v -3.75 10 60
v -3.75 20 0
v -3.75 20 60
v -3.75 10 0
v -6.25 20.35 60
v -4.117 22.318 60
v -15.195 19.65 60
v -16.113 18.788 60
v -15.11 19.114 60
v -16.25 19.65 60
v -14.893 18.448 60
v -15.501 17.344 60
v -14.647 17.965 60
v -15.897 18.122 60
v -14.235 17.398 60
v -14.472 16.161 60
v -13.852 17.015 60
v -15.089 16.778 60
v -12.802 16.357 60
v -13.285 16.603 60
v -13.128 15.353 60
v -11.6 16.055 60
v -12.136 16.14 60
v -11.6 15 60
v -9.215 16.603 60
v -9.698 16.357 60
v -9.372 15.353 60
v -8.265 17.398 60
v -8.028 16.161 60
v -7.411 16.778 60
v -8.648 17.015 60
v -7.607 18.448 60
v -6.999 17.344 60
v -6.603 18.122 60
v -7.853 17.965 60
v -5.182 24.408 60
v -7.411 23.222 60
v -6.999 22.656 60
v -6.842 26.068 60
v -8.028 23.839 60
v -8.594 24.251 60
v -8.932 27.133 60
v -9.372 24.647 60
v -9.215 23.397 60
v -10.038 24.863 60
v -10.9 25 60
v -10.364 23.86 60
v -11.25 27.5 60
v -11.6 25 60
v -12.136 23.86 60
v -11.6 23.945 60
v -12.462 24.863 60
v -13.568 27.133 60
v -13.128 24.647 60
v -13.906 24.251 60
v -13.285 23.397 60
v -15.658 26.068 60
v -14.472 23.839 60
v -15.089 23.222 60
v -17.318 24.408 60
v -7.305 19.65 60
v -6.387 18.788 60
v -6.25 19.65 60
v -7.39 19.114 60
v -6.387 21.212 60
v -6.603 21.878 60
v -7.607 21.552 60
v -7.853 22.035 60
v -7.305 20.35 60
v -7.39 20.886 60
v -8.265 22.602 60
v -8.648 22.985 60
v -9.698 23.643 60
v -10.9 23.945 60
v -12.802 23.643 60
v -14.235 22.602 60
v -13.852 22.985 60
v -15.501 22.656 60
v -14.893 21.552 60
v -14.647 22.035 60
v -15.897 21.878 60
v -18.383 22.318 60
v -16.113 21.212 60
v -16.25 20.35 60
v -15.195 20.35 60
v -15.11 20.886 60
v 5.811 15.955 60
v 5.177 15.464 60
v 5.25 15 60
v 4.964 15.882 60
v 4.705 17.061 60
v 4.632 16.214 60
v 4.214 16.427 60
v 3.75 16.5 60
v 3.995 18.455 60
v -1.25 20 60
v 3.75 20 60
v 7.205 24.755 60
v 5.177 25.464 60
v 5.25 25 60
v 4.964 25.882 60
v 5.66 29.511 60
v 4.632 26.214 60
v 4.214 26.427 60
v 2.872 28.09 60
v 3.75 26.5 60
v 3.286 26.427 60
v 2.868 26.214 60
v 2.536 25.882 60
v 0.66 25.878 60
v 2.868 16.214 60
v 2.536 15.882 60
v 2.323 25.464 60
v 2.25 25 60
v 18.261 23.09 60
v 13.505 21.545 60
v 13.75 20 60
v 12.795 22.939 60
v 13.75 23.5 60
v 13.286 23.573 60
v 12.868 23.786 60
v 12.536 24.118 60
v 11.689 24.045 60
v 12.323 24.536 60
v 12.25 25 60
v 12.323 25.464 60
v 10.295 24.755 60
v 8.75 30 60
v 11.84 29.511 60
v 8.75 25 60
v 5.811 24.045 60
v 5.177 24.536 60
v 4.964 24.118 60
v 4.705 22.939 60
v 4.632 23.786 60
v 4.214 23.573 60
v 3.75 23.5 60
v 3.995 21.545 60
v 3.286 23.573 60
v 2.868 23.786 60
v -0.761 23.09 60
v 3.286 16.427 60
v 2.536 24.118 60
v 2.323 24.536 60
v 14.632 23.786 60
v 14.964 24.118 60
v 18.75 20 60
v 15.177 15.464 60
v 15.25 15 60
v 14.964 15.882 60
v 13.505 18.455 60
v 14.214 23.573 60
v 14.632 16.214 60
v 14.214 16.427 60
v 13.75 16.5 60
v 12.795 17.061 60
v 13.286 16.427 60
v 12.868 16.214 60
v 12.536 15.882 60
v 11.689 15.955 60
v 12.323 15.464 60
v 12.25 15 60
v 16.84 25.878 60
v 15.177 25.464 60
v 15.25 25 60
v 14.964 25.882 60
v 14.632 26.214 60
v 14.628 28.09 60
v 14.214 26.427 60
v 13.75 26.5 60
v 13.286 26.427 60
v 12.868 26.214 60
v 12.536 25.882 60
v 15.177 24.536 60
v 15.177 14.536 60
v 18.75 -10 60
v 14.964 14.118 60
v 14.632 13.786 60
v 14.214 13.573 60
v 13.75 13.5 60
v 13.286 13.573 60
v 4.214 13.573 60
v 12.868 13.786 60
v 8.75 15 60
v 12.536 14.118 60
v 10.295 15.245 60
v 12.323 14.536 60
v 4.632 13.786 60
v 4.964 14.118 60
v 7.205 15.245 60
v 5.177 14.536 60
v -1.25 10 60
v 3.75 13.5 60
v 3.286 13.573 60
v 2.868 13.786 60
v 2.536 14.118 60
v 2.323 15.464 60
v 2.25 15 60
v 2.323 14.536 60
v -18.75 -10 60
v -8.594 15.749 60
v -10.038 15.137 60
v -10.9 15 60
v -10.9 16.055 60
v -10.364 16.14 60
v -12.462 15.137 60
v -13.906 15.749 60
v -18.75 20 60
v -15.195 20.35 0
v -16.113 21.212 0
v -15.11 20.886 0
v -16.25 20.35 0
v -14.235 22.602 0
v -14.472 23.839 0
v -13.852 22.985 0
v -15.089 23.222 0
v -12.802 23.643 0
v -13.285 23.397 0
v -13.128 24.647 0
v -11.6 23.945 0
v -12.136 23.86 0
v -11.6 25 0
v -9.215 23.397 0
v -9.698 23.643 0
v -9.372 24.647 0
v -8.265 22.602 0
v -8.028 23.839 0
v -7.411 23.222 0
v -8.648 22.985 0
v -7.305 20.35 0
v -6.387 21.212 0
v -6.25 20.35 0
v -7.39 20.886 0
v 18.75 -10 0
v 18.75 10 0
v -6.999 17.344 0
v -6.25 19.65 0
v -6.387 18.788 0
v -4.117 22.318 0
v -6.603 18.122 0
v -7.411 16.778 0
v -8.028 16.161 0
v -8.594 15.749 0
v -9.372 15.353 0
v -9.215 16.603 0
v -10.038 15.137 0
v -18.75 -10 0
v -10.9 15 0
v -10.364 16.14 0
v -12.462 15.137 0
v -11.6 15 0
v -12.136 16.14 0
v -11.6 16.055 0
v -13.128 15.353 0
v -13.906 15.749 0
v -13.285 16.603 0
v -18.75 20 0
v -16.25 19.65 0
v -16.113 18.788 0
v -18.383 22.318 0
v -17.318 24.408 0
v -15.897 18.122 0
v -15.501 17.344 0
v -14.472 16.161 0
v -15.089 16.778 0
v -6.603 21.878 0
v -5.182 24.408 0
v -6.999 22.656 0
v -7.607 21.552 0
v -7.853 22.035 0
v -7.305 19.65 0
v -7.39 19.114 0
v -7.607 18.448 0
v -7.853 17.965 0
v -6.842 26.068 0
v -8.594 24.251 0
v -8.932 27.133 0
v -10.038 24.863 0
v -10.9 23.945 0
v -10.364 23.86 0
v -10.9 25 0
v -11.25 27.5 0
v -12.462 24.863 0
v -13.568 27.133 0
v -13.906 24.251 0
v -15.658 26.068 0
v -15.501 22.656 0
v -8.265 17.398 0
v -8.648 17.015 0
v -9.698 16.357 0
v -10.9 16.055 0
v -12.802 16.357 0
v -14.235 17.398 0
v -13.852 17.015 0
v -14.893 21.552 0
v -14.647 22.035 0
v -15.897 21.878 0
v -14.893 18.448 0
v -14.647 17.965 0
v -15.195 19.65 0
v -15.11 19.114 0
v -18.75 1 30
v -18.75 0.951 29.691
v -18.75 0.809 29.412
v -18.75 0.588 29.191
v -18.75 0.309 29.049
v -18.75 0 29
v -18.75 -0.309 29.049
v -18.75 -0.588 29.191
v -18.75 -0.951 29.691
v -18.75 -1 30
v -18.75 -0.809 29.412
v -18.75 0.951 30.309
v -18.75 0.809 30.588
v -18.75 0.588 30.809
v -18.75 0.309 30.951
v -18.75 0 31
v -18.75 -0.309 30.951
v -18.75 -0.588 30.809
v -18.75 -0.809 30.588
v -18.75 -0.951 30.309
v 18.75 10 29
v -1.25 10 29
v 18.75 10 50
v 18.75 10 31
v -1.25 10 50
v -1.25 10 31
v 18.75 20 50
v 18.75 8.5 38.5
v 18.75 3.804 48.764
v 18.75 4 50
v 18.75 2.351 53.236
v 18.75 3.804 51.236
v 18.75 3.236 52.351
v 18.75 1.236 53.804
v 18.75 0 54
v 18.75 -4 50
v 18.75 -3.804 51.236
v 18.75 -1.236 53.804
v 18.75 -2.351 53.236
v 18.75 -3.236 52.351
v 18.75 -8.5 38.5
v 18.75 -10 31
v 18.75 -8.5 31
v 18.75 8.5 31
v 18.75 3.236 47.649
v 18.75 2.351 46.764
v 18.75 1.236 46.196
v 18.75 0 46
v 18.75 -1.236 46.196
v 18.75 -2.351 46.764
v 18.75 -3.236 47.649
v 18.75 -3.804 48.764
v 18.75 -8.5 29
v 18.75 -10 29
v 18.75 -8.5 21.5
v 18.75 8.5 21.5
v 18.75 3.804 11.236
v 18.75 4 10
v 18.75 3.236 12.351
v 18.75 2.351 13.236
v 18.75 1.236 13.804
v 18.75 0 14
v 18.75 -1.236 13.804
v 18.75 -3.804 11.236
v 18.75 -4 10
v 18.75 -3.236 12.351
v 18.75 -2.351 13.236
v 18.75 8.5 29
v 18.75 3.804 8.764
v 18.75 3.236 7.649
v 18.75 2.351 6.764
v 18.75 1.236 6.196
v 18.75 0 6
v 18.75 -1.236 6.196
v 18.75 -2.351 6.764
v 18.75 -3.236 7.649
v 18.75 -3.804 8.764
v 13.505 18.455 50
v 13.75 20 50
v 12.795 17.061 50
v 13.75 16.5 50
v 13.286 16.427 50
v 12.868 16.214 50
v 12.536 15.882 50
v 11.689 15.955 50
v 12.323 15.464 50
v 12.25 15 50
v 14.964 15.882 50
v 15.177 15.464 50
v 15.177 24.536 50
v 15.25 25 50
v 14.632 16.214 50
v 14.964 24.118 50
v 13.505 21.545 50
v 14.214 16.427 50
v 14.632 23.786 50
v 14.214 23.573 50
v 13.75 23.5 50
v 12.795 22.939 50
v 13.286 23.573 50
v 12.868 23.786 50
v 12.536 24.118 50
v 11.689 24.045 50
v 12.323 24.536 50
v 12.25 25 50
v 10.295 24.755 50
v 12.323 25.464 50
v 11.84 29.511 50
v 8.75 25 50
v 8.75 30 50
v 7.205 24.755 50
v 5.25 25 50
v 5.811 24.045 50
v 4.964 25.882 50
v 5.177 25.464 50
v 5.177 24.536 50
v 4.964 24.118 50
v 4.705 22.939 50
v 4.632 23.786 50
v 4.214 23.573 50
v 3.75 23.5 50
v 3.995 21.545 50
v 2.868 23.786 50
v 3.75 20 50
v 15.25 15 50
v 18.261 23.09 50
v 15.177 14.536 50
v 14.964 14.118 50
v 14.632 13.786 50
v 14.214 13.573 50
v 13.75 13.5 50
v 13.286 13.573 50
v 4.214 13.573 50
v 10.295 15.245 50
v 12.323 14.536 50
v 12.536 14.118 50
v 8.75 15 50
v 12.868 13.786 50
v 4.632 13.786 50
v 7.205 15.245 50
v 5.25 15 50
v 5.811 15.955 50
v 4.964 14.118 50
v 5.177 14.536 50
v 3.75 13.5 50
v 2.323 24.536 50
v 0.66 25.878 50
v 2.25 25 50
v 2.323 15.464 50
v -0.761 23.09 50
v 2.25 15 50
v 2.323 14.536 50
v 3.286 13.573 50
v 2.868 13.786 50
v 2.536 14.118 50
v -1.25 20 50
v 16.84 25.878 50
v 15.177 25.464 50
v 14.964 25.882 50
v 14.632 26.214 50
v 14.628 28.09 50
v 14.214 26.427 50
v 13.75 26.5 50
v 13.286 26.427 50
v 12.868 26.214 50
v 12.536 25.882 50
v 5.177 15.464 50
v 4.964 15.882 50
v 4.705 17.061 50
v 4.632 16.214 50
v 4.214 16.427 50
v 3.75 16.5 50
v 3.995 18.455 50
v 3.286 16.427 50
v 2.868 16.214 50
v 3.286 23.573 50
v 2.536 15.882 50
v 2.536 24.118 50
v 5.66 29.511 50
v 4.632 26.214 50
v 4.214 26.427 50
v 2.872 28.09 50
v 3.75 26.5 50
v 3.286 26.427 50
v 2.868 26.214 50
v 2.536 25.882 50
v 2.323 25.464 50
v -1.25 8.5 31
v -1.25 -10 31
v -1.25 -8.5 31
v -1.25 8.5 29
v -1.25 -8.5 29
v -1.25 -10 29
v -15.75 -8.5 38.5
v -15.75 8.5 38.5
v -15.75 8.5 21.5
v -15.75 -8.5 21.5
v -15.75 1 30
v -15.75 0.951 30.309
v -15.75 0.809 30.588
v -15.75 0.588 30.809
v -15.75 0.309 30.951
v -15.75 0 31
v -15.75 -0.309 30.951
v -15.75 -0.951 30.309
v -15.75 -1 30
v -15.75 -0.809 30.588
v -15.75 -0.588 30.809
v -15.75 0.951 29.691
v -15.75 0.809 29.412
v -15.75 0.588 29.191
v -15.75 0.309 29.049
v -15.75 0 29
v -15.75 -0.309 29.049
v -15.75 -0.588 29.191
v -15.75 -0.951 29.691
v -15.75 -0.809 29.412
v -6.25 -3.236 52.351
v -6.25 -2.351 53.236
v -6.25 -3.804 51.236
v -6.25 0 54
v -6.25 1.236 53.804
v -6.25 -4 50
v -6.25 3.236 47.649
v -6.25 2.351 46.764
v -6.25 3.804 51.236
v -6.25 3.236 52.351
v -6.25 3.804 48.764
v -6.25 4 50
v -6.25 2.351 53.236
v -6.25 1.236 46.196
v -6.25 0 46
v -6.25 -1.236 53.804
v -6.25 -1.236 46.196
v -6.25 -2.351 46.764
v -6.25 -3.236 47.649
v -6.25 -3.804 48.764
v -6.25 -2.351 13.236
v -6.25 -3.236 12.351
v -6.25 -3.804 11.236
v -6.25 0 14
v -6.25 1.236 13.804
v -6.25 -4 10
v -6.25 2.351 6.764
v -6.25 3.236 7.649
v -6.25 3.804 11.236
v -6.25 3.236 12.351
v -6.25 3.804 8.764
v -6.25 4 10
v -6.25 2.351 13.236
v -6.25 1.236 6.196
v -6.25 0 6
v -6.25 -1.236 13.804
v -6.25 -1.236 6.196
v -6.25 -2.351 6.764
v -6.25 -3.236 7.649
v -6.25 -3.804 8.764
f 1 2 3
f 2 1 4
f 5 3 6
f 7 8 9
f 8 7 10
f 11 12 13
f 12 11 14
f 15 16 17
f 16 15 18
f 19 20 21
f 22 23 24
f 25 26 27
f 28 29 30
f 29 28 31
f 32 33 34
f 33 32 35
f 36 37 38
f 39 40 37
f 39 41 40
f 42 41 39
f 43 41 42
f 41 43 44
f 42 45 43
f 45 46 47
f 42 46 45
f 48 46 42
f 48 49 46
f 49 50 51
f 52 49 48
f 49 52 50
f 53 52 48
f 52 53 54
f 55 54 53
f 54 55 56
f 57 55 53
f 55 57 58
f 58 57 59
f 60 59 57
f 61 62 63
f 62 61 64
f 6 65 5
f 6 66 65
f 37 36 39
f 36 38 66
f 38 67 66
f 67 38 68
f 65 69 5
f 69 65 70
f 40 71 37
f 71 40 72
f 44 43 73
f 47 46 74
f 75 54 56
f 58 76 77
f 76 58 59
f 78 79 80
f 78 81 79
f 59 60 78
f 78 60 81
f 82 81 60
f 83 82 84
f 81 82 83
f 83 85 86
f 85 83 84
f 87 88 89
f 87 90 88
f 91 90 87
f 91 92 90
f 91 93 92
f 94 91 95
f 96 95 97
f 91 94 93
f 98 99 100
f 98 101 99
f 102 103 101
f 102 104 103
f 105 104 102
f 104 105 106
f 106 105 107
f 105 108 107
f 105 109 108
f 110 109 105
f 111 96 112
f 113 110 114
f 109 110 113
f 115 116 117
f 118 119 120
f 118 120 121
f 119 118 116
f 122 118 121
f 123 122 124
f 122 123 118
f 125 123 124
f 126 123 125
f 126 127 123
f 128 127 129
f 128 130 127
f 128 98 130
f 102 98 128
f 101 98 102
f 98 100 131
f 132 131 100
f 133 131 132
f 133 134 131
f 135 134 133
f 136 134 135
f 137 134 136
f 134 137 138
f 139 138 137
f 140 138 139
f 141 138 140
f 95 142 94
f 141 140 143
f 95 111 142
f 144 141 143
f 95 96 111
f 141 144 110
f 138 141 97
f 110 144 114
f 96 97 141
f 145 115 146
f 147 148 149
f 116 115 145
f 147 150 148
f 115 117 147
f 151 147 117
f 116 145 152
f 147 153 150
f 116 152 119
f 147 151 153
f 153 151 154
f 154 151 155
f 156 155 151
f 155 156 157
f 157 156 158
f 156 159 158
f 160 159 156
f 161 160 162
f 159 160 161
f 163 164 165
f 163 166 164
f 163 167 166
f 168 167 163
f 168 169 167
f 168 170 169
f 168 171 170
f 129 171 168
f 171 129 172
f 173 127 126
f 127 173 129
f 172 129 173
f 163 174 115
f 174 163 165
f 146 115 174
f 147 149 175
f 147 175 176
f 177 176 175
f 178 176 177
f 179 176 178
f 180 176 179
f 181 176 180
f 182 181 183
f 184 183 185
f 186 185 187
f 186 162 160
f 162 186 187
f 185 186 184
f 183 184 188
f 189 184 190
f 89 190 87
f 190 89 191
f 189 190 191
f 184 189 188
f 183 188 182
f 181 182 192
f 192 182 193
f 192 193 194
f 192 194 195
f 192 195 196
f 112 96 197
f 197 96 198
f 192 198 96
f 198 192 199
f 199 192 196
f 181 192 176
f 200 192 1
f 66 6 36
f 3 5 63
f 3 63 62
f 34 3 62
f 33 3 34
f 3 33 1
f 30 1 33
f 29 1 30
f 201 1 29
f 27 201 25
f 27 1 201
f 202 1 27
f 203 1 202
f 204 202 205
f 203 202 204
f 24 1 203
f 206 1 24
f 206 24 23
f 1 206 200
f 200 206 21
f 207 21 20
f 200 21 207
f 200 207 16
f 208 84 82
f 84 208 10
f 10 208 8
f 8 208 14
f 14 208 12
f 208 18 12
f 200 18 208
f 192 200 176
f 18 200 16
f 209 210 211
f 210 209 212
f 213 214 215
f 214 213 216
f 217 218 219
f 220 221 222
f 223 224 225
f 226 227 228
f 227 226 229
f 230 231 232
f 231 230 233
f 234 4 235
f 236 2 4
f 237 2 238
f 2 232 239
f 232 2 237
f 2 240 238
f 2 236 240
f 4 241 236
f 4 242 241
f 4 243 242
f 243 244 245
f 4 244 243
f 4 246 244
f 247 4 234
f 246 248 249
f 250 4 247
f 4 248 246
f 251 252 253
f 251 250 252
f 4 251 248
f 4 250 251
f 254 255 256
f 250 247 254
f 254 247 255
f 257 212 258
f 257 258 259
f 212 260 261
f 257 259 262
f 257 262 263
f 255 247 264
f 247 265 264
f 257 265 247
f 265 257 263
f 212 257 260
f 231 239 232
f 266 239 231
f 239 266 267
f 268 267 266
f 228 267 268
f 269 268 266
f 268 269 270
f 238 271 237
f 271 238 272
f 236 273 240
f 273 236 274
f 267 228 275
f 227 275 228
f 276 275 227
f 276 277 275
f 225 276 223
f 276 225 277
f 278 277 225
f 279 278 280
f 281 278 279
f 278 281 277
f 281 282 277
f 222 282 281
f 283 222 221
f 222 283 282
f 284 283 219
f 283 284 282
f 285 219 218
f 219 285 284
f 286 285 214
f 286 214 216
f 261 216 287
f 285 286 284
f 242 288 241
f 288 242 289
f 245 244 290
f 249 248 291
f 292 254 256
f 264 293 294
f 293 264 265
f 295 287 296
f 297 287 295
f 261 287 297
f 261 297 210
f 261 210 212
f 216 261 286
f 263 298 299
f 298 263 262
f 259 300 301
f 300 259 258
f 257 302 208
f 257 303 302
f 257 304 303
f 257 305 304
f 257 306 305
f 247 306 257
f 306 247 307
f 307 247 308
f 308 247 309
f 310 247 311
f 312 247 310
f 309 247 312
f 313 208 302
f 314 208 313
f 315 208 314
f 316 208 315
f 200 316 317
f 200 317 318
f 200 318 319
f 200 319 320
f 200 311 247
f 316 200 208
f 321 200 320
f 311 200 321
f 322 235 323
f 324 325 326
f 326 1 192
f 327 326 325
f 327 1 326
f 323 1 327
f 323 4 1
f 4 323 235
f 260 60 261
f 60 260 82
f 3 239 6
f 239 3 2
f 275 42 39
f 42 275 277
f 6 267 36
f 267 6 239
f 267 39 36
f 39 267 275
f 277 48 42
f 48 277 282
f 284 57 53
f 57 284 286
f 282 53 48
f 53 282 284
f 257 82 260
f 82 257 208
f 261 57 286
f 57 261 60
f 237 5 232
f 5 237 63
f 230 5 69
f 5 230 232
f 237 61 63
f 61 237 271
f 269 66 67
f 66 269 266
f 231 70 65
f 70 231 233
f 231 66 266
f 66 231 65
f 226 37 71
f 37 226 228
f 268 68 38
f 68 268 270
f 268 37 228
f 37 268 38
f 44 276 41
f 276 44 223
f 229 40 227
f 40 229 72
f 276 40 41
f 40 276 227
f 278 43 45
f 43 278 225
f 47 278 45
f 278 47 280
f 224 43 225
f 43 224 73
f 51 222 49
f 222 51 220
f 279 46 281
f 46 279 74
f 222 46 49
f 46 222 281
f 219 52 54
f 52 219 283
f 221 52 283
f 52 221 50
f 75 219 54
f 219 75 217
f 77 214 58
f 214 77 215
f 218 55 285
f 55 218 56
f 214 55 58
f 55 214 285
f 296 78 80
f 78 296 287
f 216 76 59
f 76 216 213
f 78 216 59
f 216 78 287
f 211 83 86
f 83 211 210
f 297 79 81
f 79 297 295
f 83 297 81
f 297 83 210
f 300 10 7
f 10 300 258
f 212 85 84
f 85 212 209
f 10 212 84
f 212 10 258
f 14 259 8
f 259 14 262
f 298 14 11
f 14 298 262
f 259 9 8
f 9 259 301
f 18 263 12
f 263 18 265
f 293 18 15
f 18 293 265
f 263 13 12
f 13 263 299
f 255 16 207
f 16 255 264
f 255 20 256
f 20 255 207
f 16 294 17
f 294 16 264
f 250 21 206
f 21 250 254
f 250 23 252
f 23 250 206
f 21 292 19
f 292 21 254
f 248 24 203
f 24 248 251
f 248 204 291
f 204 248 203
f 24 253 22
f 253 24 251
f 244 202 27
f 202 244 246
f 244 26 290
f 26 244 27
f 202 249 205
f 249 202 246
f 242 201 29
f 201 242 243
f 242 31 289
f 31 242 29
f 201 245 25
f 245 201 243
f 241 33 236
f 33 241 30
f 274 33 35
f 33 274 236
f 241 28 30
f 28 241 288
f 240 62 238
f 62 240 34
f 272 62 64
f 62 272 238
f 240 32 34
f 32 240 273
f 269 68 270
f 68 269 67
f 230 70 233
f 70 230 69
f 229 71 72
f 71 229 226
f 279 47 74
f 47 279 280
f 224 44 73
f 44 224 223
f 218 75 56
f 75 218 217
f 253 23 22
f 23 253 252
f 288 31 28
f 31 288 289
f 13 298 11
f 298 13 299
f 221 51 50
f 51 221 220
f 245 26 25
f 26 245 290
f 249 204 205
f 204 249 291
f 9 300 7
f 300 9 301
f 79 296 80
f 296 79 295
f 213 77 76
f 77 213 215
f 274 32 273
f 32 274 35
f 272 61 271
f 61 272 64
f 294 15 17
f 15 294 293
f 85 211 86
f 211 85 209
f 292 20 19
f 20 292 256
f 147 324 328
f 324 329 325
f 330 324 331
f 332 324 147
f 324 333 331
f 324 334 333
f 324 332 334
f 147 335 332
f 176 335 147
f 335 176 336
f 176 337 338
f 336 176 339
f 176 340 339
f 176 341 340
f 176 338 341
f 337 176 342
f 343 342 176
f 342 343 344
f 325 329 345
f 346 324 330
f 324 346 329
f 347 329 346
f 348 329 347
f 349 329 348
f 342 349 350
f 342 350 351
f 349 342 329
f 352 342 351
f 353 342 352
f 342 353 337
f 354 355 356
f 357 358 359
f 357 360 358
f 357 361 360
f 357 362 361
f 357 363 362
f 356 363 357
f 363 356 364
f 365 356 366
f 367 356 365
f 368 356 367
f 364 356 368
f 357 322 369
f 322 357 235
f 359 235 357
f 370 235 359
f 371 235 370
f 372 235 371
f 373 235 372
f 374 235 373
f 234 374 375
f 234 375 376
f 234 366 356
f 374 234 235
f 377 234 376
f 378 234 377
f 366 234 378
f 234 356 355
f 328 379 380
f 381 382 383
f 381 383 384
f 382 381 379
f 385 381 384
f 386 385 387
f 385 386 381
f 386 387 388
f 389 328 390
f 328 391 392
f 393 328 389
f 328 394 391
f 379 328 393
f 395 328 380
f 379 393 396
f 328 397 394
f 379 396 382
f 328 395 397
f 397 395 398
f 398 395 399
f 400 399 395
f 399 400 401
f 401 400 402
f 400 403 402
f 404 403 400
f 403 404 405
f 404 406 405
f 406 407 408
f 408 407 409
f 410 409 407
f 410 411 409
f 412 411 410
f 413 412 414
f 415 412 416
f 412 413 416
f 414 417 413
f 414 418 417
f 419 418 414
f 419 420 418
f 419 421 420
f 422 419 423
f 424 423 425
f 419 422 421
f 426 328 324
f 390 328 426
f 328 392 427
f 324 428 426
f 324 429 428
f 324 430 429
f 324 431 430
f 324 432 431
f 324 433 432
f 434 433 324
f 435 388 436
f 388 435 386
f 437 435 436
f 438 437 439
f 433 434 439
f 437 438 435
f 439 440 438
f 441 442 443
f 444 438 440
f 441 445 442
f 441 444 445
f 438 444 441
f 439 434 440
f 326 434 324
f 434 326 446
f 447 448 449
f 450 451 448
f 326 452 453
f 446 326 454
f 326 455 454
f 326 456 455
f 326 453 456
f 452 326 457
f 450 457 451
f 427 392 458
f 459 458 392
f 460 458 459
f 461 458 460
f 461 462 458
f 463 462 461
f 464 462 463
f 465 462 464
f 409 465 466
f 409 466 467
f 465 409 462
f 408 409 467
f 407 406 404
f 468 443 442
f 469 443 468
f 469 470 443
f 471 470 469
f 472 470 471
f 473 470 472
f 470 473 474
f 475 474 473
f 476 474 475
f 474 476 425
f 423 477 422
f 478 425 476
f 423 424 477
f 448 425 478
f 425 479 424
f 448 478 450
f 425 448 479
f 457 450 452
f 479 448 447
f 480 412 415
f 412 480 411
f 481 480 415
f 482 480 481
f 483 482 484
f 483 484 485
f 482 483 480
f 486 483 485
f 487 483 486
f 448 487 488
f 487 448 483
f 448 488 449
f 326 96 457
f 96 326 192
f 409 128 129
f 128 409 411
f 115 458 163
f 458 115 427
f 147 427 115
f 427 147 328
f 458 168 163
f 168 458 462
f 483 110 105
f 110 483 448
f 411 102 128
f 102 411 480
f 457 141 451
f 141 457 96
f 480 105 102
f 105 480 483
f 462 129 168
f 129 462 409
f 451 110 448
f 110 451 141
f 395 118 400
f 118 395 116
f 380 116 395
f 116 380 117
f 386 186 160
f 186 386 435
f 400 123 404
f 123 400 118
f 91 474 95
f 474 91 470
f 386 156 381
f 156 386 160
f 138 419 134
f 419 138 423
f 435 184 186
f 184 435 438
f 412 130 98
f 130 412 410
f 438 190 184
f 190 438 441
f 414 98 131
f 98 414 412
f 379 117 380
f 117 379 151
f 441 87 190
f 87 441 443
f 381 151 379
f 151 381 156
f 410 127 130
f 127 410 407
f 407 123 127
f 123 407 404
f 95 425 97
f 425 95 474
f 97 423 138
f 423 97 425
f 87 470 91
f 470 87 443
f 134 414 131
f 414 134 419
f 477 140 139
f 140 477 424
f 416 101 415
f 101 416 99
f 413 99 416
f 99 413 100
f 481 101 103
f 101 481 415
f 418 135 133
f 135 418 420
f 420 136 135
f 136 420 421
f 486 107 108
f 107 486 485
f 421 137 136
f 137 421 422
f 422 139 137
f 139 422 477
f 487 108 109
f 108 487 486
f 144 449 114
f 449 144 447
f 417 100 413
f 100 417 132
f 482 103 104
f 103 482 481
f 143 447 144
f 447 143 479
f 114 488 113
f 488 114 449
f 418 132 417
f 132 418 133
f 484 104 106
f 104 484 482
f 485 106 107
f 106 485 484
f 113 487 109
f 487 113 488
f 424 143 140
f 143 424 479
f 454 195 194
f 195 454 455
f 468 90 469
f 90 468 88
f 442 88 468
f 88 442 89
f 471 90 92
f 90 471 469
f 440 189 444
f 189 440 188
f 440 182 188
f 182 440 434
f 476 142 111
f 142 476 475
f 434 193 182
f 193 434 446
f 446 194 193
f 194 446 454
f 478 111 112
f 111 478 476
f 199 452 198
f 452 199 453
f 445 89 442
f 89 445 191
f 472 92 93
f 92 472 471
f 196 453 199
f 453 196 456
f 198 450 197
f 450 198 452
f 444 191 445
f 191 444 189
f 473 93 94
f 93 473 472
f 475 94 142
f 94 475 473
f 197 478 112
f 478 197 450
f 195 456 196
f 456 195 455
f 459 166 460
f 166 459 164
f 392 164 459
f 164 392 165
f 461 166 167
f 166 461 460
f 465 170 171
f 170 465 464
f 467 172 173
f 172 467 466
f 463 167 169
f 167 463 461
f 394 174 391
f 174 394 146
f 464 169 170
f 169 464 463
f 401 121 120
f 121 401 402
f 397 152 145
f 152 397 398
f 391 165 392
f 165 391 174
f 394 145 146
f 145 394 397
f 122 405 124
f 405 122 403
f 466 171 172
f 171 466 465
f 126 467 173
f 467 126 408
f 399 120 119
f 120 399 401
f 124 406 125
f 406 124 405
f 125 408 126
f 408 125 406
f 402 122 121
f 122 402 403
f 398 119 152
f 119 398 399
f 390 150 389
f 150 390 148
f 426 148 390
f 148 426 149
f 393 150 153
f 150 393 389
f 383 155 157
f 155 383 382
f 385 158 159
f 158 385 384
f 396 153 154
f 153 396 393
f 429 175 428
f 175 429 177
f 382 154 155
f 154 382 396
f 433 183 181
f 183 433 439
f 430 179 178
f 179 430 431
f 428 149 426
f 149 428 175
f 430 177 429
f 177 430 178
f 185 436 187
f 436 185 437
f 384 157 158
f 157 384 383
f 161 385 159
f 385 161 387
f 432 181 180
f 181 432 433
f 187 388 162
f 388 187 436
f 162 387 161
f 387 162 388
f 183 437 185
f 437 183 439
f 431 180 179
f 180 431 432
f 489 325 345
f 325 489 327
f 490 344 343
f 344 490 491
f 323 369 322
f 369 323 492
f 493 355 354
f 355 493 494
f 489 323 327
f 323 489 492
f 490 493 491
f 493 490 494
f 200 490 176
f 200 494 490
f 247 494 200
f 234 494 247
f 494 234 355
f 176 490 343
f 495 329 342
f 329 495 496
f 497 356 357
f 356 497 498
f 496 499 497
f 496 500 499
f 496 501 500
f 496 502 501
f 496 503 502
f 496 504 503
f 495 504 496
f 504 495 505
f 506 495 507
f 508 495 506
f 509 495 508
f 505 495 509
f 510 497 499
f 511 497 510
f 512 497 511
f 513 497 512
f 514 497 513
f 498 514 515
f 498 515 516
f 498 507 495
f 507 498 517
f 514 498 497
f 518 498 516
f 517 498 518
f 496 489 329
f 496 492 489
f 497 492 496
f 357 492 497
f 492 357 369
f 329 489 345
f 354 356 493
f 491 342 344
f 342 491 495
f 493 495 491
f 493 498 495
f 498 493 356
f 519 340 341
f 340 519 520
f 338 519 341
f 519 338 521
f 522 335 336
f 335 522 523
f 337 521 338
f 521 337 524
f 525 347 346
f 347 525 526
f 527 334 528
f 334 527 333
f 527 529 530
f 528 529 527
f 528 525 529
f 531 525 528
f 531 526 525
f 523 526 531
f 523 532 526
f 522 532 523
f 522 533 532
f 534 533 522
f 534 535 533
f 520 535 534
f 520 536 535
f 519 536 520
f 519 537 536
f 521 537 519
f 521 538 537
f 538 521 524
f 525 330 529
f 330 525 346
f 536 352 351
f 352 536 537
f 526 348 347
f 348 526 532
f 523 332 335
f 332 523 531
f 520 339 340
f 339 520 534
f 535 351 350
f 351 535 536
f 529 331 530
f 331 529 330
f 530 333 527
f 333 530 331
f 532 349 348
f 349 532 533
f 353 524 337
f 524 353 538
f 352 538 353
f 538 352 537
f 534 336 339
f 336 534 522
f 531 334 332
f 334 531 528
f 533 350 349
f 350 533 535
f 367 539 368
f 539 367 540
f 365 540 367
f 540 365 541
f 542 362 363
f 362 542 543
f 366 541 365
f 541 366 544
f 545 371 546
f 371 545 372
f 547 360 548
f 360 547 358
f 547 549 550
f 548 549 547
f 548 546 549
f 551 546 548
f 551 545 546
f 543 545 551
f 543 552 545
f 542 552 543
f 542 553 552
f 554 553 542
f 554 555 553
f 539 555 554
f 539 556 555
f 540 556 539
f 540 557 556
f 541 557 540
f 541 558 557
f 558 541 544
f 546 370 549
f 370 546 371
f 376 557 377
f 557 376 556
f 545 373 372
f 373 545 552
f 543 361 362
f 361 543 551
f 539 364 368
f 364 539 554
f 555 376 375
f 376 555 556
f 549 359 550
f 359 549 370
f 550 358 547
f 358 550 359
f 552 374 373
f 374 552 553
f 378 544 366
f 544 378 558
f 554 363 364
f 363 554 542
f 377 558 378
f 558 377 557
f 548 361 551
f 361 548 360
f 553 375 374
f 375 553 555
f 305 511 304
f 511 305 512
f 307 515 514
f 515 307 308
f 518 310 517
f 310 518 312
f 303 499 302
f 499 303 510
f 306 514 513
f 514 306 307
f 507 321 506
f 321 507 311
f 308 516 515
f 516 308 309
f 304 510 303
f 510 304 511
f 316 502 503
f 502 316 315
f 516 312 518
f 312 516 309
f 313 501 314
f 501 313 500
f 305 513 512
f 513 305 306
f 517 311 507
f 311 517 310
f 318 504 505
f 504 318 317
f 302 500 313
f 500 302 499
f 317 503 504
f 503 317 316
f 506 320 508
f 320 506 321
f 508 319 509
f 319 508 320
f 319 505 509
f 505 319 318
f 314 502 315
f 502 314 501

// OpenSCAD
$fn=20;

/*[Global]*/
    //Axis=[r]
    AxisRadius = [4];
    //Slider Hole [radius]
    SliderHoleRadius = [4];
    //M3 Screw Thread Clearance Radius
    M3ScrewHole = [1.5];
    //Z Axis Guide to Z Screw 
    ZA2ZSSeparation = [25];

/*[Z Screw Holder Block]*/
    //Z Screw Holder Block = [OuterRadius, InnerRadius, Height]
    ZSH = [10, 5, 10];
    ZSHM3Separation = [10];

/*[Z Axis Holder Block]*/
    //Z Axis Holder = [w or external diameter,displacement of center of hole]
    ZAH = [15,ZSH[1]];
    //Z Axis Cutout to Slider Hole = [w]
    ZAHCutout = [10];
    numberOfTeeth = 20;
    toothWidth = .7;
    toothDepth = 2;


/*[X Axis Holder Block]*/
    //X Axis Holder = [w,d,h]
    XAH = [ZA2ZSSeparation[0] + ZAH[0]/2 + ZSH[0]/2, 20, 60];
    //X Axis Hole depth and position from the bottom of the Holder block
    XAxisHoleDepth = [25];
    XAxisHoleSeparation = [40];
    XAxisHole1Height = XAH[2]/2+XAxisHoleSeparation[0]/2;
    XAxisHole2Height = XAH[2]/2-XAxisHoleSeparation[0]/2;

/*[X Pulley Hole]*/
    pulleyAxleHoleDepth = 20;
    pulleyAxleClearanceRadius = 2;
    pulleyFullHoleDepth = XAH[0]-3;
    pulleyFullHoleWidth = 17;
    pulleyFullHoleHeight = 17;


module XAxisHole() {
           rotate([0, -90, 0])
                cylinder(r=AxisRadius[0], h=XAxisHoleDepth[0]);

}

module XPulleyHole(){
    union() {
        //pulley Axle Hole
        translate([-pulleyAxleHoleDepth+XAH[0]/2, 0, pulleyFullHoleHeight/2-pulleyAxleClearanceRadius/2])
            cube([pulleyAxleHoleDepth, XAH[1], pulleyAxleClearanceRadius]);
        //rest of the pulley hole
        translate([-pulleyFullHoleDepth+XAH[0]/2, (XAH[1]-pulleyFullHoleWidth)/2, 0])
            cube([pulleyFullHoleDepth, pulleyFullHoleWidth, pulleyFullHoleHeight]);
    }
}

module XPulleyTightenerHole() {
    rotate([0, 90, 0])
        cylinder(r=M3ScrewHole, h=5);
}

module XAxisHolder() {
    //X Axis Holder Block
    difference() {
        //X Axis Holder Raw Block
#        translate(-[XAH[0]/2, XAH[1]/2, 0])  cube([XAH[0], XAH[1], XAH[2]]);

        //X Axis Support Hole 1
        translate([XAH[0]/2, 0, XAxisHole1Height]) XAxisHole();
 
        //X Axis Support Hole 2
        translate([XAH[0]/2, 0, XAxisHole2Height]) XAxisHole();

        //X Pulley Hole
        translate([0, -XAH[1]/2 ,(XAH[2]-pulleyFullHoleHeight)/2]) XPulleyHole();

        //X Pulley Tightener Hole
        translate([-XAH[0]/2, 0, XAH[2]/2]) XPulleyTightenerHole();

    }
}


module tooth() {
    translate([-toothDepth/2,-toothWidth/2,0]) 
        cube([toothDepth,toothWidth,XAH[2]]);
    
}

module ZAxisHolder() {
    difference() {
        union() {
            //support part
            cube([ZAH[0],ZSH[0],XAH[2]]);
            translate([ZAH[0]/2,ZSH[0],0])
                cylinder(r=ZAH[0]/2,h=XAH[2]);
        }

            translate([ZAH[0]/2,ZSH[0],0])
        union(){
            cylinder(r=SliderHoleRadius[0], h=XAH[2]);

            for(i=[0:numberOfTeeth]) //n is number of teeth
                rotate([0,0,i*360/numberOfTeeth])
                    translate([SliderHoleRadius[0],0,0]) // r is radius of circle
                        tooth(); // tooth is the module that describes the shape of the tooth.
        }
    }
}

module ZScrewHolder() {
    //Z Screw Holder Main Block
    difference() {
        union() {
            translate([-ZSH[0],0,0]) cube([ZSH[0]*2,ZSH[0],ZSH[2]]);
            translate([0,ZSH[0],0]) cylinder(r=ZSH[0], h=ZSH[2]);
        }
        //Z Screw Holder centre hole
        translate([0,ZSH[0],0]) cylinder(r=ZSH[1], h=ZSH[2]);
        //Z Screw Holder M3 Throughholes
        translate([-ZSHM3Separation[0]/2, ZSH[0]+ZSHM3Separation[0]/2,0]) cylinder(r=M3ScrewHole[0], h=ZSH[2]);
        translate([-ZSHM3Separation[0]/2, ZSH[0]-ZSHM3Separation[0]/2,0]) cylinder(r=M3ScrewHole[0], h=ZSH[2]);
        translate([ZSHM3Separation[0]/2, ZSH[0]+ZSHM3Separation[0]/2,0]) cylinder(r=M3ScrewHole[0], h=ZSH[2]);
        translate([ZSHM3Separation[0]/2, ZSH[0]-ZSHM3Separation[0]/2,0]) cylinder(r=M3ScrewHole[0], h=ZSH[2]);

    }
    
}

//Z Axis Holder Left Construction
module main() {
    translate([-XAH[0]/2, XAH[1]/2, 0]) 
        ZAxisHolder();
    translate([XAH[0]/2-ZSH[0],  XAH[1]/2,  XAH[2]-ZSH[2]]) 
        ZScrewHolder();
    XAxisHolder();
}

main();
//XPulleyHole();
//        translate([0, -XAH[1]/2 ,(XAH[2]-pulleyFullHoleHeight)/2]) XPulleyHole();

/* unused */

   /*    #linear_extrude(XAH[2])
            polygon([
                [-XAH[0]/2,-XAH[1]/2],
                [XAH[0]/2,-XAH[1]/2],
                [XAH[0]/2,XAH[1]/2],
                [-XAH[0]/2,XAH[1]/2]]
            );*/
 
module ZAxisHolder1() {
    difference() {
        //Z Axis Holder Raw Block
        translate([-ZAH[0]/2,0,0])
            cube([ZAH[0], ZAH[1], XAH[2]]);
        //Z Axis Slider holder
        translate([0, SliderHoleRadius[0], 0])
            cylinder(r=SliderHoleRadius[0], h=XAH[2]);
        // Z Axis Holder cutout to Slider holder
        translate([-ZAHCutout[0]/2,SliderHoleRadius[0],0])
            cube([ZAHCutout[0],ZAH[1]-SliderHoleRadius[0], XAH[2]]);
    }
}
